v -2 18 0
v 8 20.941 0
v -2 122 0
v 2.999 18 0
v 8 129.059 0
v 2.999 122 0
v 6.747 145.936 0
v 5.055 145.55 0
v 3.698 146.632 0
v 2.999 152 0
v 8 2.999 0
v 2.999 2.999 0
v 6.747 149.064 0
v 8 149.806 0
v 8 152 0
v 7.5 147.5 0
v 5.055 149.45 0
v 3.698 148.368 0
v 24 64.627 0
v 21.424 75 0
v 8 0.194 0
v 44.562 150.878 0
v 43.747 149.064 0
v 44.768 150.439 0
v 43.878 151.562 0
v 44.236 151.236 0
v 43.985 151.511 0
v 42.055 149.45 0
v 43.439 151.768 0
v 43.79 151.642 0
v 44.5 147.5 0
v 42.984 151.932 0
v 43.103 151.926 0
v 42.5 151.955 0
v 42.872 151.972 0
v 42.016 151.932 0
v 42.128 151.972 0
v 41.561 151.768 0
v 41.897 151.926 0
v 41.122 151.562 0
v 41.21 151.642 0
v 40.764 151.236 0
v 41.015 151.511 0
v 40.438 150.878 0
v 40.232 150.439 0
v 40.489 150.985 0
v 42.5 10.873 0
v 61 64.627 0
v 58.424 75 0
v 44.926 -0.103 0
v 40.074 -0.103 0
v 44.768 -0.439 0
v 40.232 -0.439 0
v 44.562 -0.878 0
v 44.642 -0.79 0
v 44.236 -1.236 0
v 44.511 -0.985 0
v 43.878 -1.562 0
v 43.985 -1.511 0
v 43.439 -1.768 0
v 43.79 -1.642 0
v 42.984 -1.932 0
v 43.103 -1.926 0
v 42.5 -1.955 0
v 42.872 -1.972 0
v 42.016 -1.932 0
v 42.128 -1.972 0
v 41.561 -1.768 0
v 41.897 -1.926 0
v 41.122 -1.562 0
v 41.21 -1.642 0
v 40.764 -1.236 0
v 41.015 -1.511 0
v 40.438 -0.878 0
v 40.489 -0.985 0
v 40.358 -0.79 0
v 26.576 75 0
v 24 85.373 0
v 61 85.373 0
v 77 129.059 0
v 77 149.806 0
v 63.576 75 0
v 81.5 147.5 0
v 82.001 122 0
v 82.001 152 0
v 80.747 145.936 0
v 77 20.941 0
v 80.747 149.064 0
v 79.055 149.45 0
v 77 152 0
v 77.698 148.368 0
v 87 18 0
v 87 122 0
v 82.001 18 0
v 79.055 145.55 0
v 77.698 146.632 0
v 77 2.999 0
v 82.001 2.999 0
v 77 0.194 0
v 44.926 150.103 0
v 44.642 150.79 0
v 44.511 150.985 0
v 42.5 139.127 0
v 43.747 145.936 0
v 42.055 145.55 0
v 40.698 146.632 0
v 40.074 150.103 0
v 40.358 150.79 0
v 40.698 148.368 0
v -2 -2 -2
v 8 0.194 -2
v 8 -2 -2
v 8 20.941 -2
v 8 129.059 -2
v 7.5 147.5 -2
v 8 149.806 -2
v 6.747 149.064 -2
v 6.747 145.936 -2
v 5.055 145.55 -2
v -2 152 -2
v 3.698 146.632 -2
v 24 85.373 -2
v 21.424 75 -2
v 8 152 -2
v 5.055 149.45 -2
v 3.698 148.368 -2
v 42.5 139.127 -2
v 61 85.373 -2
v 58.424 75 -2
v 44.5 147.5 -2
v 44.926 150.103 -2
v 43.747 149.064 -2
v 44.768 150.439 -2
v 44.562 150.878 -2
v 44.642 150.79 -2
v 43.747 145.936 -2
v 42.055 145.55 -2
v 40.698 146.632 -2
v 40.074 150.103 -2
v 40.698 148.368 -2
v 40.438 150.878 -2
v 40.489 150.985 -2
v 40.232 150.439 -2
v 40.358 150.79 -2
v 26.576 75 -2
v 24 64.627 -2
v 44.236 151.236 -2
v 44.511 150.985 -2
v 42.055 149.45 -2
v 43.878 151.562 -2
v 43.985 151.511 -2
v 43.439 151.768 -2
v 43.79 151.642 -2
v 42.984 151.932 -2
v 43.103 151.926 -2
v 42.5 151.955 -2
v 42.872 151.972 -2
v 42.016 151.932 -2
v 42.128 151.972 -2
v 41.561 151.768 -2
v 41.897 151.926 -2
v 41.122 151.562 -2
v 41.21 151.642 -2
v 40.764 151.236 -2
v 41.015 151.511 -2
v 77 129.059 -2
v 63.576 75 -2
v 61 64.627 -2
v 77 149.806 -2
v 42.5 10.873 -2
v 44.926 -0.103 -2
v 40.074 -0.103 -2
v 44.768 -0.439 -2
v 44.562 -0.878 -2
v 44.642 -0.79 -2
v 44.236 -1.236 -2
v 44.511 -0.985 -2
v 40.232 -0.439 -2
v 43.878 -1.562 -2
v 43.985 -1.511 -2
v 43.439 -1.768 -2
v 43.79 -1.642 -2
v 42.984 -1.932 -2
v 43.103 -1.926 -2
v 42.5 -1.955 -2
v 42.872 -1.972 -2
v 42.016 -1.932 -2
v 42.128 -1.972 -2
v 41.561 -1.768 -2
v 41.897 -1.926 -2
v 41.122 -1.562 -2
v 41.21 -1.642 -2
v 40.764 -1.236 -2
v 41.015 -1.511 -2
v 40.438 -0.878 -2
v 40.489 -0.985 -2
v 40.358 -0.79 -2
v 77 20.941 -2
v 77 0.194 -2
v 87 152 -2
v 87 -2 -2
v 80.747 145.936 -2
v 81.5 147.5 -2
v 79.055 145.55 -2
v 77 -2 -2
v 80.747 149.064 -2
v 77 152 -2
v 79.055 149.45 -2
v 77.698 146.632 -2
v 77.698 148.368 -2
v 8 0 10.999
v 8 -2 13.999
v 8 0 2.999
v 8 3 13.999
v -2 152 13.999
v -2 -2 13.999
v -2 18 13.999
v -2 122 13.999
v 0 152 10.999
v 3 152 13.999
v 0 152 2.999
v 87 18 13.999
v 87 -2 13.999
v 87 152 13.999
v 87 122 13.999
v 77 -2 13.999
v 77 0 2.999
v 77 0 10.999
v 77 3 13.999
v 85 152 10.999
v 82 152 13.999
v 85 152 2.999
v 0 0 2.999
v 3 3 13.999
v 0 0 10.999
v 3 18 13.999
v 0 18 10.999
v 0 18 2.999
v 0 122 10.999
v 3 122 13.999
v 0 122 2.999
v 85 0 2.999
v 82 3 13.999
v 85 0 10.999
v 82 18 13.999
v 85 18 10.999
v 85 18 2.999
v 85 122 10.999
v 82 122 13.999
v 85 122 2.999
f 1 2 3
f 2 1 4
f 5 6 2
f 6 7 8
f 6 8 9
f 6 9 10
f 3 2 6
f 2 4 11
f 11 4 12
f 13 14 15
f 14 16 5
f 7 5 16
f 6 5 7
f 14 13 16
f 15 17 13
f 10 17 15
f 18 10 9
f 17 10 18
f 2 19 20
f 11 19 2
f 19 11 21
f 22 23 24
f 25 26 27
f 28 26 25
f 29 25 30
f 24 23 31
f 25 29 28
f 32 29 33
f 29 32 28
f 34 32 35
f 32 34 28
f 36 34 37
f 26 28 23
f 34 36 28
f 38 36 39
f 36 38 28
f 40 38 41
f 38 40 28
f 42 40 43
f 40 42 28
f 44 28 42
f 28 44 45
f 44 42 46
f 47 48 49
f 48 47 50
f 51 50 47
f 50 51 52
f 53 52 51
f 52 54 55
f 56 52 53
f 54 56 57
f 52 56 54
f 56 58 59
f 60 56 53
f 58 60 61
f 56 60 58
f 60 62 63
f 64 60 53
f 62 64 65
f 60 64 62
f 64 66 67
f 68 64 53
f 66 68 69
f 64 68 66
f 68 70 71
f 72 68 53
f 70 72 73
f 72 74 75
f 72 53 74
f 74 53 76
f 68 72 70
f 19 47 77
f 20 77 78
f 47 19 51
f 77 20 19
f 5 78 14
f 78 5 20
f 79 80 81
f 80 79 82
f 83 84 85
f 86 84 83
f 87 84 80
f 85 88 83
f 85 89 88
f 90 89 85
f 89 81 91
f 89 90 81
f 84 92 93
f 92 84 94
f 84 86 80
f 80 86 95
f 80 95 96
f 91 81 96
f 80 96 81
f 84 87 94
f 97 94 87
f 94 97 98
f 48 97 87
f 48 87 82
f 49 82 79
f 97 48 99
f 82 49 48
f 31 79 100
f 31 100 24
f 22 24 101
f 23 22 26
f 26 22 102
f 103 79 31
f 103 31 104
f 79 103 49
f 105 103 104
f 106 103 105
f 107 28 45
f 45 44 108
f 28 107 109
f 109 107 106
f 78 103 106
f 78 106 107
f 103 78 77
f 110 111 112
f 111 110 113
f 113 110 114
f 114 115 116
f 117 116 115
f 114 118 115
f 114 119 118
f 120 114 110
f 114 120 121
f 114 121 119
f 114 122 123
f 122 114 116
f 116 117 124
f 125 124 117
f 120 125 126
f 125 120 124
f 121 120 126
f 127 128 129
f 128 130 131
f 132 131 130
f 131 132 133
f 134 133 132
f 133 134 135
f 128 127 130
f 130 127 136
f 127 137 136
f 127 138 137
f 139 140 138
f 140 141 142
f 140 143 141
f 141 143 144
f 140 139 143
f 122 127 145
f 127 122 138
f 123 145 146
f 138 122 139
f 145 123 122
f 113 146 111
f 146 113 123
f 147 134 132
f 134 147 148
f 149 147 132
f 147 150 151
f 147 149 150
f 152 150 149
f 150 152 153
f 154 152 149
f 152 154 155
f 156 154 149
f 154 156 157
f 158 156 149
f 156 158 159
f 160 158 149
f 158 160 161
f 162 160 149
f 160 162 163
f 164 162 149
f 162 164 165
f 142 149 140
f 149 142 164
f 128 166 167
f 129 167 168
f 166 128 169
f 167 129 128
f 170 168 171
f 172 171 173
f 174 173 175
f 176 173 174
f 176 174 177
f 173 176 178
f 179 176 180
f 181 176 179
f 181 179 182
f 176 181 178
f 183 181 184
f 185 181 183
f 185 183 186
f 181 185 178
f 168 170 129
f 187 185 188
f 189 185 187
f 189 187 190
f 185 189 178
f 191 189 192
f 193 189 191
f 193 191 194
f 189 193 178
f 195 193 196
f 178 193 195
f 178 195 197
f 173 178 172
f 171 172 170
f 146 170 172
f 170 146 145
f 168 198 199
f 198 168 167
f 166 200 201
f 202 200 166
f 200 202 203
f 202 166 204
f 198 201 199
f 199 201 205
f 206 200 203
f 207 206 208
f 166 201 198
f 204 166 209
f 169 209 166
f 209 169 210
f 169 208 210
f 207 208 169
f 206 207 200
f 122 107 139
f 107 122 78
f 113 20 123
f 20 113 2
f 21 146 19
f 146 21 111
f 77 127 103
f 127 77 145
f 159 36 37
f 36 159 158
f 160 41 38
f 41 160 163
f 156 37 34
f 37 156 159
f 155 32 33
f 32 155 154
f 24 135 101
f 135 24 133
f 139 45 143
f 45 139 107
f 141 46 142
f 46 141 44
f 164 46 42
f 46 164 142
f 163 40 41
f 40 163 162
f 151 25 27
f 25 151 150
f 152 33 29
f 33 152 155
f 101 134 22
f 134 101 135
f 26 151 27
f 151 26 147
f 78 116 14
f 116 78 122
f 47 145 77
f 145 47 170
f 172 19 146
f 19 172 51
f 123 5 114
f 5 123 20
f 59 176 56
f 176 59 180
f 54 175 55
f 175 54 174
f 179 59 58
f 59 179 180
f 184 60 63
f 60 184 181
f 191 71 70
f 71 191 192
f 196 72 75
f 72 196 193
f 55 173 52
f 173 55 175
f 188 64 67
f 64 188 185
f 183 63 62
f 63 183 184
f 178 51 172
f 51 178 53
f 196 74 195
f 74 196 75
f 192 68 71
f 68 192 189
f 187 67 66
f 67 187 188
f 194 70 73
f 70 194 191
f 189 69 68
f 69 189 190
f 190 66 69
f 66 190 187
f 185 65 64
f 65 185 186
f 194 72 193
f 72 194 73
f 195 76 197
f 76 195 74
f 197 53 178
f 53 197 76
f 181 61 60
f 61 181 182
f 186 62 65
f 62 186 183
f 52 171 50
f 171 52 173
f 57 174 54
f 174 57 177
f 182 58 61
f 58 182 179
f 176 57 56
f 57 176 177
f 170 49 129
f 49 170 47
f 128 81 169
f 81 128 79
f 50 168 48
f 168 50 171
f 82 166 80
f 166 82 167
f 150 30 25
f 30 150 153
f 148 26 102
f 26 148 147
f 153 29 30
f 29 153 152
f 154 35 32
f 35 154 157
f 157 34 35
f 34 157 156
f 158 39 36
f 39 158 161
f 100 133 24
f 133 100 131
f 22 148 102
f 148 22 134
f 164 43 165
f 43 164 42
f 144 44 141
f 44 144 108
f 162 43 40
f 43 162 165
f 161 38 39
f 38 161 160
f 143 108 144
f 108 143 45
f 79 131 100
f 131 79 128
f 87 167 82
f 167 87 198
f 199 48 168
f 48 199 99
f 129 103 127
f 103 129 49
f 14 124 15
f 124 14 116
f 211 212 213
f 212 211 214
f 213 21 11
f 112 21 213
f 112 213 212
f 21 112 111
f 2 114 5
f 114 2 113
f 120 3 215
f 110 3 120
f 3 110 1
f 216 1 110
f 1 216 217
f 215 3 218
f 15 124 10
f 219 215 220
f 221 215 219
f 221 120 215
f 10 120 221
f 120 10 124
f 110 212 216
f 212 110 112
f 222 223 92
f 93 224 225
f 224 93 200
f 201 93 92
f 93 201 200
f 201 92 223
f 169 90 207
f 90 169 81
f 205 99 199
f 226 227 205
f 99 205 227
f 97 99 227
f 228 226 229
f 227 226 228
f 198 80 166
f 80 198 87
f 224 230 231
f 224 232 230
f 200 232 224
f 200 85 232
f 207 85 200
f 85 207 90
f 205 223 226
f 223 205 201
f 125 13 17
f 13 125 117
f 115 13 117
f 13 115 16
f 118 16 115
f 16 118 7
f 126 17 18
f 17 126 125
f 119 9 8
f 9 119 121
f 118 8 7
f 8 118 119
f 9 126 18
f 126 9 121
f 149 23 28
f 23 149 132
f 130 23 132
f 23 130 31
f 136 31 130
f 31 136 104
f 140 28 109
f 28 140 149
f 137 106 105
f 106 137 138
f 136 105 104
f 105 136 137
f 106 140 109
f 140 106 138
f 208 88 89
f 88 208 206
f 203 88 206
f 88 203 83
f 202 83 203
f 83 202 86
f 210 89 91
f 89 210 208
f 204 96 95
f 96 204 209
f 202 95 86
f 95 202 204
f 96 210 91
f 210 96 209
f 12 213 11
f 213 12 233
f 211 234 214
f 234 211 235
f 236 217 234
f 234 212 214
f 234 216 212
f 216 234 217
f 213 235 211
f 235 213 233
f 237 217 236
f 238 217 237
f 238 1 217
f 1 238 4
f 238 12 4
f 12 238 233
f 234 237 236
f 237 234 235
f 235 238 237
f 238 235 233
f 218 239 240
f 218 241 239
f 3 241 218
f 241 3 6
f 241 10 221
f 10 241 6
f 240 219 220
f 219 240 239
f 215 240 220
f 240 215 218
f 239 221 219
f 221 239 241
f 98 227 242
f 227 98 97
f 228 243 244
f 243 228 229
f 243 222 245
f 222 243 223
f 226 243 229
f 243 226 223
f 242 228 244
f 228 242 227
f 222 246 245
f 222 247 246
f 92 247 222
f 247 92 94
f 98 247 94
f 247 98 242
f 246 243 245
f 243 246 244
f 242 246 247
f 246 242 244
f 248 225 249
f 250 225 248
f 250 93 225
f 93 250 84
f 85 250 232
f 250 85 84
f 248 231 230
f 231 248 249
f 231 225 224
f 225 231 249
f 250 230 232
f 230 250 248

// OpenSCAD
// Boat phone holder

delta = 0.001;    // Extra distance to avoid coincident surfaces 
sqrt2 = sqrt(2);

hp    = 150;      // Height of phone
wp    = 85;       // Width of phone
dp    = 14;       // Depth opf phone
dpe   = 8;        // Depth of phone at edge

module Bevel(l,t,orientation)
{
  // Bevel with corner along +X axis from origin, with orientation:
  //  0 -> facing +Y, +Z
  //  1 -> facing -Y, +Z
  //  2 -> facing -Y, -Z
  //  3 -> facing +Y, -Z
  rotate([orientation*90,0,0])
  {
    intersection()
    {
      translate([0,0,-t])
        rotate([45,0,0])
          cube([l,t*sqrt2,t*sqrt2]);
      cube([l,t*2,t*2]);
    }
  }
}

module EdgeClasp(l,h,t,orientation)
{
  // Edge clip on X-Z plane, with orientation:
  //  0 -> facing +Y
  //  1 -> facing +X
  //  2 -> facing -Y
  //  3 -> facing -X
  //
  // l = extent along aligneed axis (from origin, + or -)
  // t = thickness of edge
  //
  la = abs(l);
  ls = orientation==0 || orientation == 3 ? l : -l ;
  rotate([0,0,-orientation*90])
    translate([0.5*(ls-la),-t,-delta])
    {
      cube([la,t,h]);
      Bevel(la,t*2.5,0);
      translate([0,0,h])
        Bevel(la,t*2.5,3);
    }
}

module AngledStrip(x1,y1,x2,y2,w,t)
{
  xd = x2-x1;
  yd = y2-y1;
  l = sqrt(xd*xd+yd*yd);
  translate([x1,y1,0])
  {
    rotate([0,0,atan2(yd,xd)])
    {
      translate([0,0,0])    cylinder(r=w/2, h=t, $fn=16);
      translate([0,-w/2,0]) cube([l,w,t]);
      translate([l,0,0])    cylinder(r=w/2, h=t, $fn=16);
    }
  }
}

module BasePlate(w,h,t,ws,wc)
{
  x1 = ws - wc/2;
  x2 = w/2;
  x3 = w - x1;
  y1 = wc/2;
  y2 = h - y1;
  hr = 2;
  difference()
  {
    union()
    {
      translate([0,0,0]) cube([ws,h,t]);
      AngledStrip(x1,y1,x2,y2,wc,t);
      AngledStrip(x1,y2,x2,y1,wc,t);
      AngledStrip(x2,y1,x3,y2,wc,t);
      AngledStrip(x2,y2,x3,y1,wc,t);
      translate([w-ws,0,0]) cube([ws,h,t]);
    }
    translate([x1,y2-hr,-delta]) cylinder(r=hr,h=t*2);
    translate([x2,y2-hr,-delta]) cylinder(r=hr,h=t*2);
    translate([x3,y2-hr,-delta]) cylinder(r=hr,h=t*2);
  }
}

module PhoneHolder(wp,hp,dp,t,ws,wc)
{
  translate([-t,-t,-t])  BasePlate(wp+t*2,hp+t*2,t,ws,wc);

  translate([-t,0,0])    EdgeClasp(ws,  dp, t, 0);
  translate([0,-t,0])    EdgeClasp(20,  dp, t, 1);
  translate([0,hp+t,0])  EdgeClasp(-30, dp, t, 1);

  translate([wp+t,0,0])  EdgeClasp(-ws, dp, t,0);
  translate([wp,-t,0])   EdgeClasp(20,  dp, t,3);
  translate([wp,hp+t,0]) EdgeClasp(-30, dp, t,3);
}

//Bevel(20,5,3);

//EdgeClasp(20,12,2,0);

//AngledStrip(10,10,20,-40,6,2);

t=2;

//BasePlate(wp+2*t, hp+2*t, t, 10, 6);

PhoneHolder(wp, hp, dp, t, 10, 5);
